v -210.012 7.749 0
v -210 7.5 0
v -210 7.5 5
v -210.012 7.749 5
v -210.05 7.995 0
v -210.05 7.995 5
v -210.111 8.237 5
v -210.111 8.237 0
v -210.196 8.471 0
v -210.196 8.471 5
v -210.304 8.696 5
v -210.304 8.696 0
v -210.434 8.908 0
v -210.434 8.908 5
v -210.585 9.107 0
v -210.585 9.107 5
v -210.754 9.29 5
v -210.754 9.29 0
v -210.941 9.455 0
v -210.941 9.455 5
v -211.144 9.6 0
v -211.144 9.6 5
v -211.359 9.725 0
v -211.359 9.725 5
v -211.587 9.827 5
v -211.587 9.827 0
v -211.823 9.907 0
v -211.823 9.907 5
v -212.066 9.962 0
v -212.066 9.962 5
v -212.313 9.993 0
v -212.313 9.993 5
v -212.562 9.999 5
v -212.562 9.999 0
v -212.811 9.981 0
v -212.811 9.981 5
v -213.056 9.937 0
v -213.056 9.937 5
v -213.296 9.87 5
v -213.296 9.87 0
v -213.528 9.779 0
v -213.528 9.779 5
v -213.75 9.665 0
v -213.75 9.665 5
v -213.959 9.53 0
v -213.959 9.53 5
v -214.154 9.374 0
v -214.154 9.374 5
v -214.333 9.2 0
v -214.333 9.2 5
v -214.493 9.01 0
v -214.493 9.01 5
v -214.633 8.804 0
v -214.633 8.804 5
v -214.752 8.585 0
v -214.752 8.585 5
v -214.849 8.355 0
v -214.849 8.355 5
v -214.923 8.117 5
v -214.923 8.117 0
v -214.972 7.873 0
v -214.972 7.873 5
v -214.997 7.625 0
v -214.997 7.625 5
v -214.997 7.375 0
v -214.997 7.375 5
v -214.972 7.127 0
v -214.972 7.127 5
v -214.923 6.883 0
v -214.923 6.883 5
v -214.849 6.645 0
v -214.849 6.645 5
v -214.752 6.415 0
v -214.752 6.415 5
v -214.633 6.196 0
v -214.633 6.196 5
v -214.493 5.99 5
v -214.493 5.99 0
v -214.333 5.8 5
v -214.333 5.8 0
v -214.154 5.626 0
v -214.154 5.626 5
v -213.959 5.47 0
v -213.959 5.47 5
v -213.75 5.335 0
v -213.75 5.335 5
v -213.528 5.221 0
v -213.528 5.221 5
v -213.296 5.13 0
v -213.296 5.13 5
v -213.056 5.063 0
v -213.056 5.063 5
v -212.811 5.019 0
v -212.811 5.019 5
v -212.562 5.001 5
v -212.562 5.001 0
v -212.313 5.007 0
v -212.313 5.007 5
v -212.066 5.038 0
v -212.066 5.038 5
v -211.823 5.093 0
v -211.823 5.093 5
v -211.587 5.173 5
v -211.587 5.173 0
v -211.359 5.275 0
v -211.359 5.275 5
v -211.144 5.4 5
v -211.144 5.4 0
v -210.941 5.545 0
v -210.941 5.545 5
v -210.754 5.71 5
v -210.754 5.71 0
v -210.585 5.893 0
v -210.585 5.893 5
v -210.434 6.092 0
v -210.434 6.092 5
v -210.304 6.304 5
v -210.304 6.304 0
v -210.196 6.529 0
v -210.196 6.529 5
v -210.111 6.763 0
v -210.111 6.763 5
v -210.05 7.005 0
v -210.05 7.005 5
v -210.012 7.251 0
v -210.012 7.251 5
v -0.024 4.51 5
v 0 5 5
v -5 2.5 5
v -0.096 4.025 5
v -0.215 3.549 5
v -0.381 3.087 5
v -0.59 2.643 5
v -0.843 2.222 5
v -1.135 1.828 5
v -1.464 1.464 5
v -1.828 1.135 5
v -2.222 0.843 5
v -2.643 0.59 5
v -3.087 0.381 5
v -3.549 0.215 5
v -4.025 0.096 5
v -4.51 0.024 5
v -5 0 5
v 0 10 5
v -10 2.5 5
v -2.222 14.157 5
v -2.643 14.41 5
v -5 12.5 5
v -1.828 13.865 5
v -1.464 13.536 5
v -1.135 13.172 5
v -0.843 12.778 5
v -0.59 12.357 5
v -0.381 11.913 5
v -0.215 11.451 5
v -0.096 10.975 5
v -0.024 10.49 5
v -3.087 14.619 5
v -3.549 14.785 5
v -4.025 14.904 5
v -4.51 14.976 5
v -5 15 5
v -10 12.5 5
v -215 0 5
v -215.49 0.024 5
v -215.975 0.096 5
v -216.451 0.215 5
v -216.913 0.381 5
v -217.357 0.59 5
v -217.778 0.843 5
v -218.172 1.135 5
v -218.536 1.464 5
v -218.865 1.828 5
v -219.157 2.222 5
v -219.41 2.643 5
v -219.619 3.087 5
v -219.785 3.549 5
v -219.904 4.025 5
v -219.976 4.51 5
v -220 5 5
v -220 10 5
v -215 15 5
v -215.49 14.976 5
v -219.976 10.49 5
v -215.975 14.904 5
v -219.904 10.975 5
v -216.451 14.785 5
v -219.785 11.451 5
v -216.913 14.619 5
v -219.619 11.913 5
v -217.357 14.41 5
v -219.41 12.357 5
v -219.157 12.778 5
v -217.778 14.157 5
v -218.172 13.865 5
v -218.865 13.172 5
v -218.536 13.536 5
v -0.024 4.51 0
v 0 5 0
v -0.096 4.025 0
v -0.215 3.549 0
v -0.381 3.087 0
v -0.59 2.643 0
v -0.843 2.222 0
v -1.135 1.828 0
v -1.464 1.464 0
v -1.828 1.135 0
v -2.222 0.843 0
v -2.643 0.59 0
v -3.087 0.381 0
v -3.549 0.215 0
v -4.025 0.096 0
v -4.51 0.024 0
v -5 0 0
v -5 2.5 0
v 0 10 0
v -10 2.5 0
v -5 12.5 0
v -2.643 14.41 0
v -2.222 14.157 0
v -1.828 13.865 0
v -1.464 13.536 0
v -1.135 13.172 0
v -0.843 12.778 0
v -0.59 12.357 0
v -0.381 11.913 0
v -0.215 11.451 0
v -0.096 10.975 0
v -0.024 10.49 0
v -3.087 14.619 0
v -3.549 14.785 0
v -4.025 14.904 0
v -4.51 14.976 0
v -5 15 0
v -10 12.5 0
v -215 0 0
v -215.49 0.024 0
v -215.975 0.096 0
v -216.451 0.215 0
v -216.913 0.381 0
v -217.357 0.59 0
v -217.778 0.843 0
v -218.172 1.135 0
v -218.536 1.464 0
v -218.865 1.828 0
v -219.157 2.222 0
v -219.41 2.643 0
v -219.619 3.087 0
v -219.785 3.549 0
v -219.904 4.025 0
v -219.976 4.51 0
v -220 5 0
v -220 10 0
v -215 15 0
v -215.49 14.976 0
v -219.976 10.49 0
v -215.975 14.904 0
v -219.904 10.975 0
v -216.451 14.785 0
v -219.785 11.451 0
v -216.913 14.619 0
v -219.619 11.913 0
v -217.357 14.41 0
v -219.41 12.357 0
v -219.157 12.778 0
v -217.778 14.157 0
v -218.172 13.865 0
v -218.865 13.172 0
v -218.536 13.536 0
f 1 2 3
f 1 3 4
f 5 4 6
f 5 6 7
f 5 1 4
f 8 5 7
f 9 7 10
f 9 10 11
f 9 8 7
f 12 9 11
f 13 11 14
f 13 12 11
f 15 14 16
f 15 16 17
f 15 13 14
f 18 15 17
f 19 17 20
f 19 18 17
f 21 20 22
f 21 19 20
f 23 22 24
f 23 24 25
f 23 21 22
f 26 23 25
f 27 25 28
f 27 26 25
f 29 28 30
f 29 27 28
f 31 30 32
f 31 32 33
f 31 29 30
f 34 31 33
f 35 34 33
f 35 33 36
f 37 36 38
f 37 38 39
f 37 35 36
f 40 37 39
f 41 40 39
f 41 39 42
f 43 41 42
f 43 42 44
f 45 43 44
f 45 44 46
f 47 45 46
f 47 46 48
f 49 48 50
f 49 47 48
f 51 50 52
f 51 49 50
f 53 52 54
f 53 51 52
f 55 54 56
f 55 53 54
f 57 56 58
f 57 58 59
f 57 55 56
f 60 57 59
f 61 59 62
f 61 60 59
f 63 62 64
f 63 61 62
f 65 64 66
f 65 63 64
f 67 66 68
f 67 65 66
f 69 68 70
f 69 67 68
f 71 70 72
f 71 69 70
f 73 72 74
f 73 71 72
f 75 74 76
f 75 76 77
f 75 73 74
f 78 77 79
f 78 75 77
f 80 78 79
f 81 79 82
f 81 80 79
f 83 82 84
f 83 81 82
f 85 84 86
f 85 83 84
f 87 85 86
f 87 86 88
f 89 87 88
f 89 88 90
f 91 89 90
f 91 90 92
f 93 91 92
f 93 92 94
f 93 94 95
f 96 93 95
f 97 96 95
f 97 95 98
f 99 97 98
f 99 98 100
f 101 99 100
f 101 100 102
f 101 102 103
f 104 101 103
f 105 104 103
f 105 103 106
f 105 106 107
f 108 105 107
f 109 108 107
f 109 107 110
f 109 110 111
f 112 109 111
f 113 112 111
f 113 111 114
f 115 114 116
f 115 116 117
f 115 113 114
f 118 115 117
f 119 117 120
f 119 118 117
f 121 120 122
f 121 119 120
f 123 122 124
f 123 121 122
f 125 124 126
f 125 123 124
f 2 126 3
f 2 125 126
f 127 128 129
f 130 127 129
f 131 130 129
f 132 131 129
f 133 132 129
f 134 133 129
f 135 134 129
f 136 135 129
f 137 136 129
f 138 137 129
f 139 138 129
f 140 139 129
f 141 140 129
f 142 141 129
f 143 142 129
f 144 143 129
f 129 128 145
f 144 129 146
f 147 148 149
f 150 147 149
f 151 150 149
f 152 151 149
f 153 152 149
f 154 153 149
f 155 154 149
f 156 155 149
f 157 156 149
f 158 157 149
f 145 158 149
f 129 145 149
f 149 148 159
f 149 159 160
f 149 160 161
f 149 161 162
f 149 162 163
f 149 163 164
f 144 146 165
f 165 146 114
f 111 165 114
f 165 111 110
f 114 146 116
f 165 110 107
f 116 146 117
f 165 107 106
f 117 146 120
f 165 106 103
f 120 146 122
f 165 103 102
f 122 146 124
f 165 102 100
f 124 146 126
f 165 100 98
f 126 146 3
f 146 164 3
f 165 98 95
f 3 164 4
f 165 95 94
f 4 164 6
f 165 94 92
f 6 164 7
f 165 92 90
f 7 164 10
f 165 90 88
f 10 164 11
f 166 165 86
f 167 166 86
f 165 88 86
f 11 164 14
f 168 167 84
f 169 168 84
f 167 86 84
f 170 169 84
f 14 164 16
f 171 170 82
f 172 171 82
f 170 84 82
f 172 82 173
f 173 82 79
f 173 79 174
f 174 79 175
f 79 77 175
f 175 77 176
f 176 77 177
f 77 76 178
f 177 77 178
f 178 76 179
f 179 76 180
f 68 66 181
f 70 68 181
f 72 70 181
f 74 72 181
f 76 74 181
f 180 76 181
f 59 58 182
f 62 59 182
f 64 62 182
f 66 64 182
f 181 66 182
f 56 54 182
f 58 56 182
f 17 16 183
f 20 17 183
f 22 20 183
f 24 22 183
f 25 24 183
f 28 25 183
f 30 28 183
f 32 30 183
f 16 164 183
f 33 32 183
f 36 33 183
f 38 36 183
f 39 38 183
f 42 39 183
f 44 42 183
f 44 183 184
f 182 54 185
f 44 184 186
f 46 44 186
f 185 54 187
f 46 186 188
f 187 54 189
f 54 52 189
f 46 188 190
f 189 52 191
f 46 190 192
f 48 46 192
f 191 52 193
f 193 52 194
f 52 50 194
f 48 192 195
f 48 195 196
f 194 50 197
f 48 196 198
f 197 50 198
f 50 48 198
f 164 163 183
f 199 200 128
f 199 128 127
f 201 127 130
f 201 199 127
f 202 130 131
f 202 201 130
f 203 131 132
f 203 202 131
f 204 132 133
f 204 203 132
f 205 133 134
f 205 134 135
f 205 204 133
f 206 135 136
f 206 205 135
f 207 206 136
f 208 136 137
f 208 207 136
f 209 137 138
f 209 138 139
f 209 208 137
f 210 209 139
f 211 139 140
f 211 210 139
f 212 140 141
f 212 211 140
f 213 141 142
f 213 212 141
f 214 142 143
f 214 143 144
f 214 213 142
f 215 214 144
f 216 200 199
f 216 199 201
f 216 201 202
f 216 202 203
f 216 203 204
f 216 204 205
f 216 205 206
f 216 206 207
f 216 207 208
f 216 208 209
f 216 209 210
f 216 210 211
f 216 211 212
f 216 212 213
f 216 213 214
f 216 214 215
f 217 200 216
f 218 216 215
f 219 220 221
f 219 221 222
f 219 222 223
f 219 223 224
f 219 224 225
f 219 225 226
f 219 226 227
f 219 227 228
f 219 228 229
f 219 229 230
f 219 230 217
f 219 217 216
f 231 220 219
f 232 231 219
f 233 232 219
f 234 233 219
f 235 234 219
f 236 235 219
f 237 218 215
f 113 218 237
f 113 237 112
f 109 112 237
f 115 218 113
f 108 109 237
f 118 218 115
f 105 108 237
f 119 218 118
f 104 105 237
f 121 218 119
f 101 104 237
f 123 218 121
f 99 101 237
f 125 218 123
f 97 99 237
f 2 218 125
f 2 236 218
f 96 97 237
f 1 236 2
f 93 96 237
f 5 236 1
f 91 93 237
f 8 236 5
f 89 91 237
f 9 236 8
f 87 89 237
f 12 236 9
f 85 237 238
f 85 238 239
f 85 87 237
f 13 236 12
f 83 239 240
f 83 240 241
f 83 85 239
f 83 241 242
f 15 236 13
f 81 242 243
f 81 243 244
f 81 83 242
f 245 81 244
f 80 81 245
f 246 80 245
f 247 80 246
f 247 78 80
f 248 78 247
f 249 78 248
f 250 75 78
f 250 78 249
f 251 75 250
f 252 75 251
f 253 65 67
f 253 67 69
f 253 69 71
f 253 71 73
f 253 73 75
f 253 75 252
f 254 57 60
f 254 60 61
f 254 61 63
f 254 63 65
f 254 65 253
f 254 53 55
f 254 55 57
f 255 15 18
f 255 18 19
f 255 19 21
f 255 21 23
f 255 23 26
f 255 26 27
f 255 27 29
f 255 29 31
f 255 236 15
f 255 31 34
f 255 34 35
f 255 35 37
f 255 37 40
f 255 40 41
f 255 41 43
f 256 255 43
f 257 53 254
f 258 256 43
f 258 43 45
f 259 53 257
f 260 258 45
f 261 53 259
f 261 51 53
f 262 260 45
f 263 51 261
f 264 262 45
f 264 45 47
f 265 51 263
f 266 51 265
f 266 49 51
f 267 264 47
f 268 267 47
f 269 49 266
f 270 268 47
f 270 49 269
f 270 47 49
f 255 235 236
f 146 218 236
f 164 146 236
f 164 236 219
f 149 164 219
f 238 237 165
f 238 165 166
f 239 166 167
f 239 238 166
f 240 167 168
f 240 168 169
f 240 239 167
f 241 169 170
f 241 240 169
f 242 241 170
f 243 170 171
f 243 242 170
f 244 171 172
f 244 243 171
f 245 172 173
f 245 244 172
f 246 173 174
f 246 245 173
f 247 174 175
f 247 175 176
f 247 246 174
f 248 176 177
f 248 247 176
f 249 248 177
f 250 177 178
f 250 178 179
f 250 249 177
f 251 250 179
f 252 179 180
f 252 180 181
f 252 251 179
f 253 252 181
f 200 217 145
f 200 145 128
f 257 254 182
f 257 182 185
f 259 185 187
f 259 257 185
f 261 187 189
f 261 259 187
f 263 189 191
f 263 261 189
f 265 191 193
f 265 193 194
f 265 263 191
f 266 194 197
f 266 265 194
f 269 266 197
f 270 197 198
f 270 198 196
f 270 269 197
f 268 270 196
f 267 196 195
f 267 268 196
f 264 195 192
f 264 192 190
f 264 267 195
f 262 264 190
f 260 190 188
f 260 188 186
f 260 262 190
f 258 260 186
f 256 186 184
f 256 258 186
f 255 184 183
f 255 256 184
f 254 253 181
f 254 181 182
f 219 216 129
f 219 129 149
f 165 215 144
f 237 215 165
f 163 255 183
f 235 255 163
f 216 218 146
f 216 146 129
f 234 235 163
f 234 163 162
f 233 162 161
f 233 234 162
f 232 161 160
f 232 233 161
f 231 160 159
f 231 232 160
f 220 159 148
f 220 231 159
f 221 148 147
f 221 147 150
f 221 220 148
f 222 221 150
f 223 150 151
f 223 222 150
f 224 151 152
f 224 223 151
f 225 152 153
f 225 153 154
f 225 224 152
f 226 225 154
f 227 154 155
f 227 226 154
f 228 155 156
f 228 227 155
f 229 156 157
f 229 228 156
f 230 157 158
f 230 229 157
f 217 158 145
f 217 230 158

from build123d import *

# Parameters (mm, degrees)
SKETCH1_R           = 2.5
SKETCH1_W           = 5
SKETCH1_H           = 10
BOSS_EXTRUDE1_DEPTH = 5


with BuildPart() as part:
    # Sketch1 → Boss-Extrude1 (new body)
    with BuildSketch(Plane.XY):
        with BuildLine():
            Line((-215, 15), (-5, 15))
            ThreePointArc((-5, 15), (-1.464466094, 13.535533906), (0, 10))
            Line((0, 10), (0, 5))
            ThreePointArc((0, 5), (-1.464466094, 1.464466094), (-5, 0))
            Line((-5, 0), (-215, 0))
            ThreePointArc((-215, 0), (-218.535533906, 1.464466094), (-220, 5))
            Line((-220, 5), (-220, 10))
            ThreePointArc((-220, 10), (-218.535533906, 13.535533906), (-215, 15))
        make_face()
        with Locations((-212.5, 7.5)):
            Circle(SKETCH1_R, mode=Mode.SUBTRACT)
        with Locations((-7.5, 7.5)):
            Rectangle(SKETCH1_W, SKETCH1_H, mode=Mode.SUBTRACT)
    extrude(amount=BOSS_EXTRUDE1_DEPTH)


solid = part.part
